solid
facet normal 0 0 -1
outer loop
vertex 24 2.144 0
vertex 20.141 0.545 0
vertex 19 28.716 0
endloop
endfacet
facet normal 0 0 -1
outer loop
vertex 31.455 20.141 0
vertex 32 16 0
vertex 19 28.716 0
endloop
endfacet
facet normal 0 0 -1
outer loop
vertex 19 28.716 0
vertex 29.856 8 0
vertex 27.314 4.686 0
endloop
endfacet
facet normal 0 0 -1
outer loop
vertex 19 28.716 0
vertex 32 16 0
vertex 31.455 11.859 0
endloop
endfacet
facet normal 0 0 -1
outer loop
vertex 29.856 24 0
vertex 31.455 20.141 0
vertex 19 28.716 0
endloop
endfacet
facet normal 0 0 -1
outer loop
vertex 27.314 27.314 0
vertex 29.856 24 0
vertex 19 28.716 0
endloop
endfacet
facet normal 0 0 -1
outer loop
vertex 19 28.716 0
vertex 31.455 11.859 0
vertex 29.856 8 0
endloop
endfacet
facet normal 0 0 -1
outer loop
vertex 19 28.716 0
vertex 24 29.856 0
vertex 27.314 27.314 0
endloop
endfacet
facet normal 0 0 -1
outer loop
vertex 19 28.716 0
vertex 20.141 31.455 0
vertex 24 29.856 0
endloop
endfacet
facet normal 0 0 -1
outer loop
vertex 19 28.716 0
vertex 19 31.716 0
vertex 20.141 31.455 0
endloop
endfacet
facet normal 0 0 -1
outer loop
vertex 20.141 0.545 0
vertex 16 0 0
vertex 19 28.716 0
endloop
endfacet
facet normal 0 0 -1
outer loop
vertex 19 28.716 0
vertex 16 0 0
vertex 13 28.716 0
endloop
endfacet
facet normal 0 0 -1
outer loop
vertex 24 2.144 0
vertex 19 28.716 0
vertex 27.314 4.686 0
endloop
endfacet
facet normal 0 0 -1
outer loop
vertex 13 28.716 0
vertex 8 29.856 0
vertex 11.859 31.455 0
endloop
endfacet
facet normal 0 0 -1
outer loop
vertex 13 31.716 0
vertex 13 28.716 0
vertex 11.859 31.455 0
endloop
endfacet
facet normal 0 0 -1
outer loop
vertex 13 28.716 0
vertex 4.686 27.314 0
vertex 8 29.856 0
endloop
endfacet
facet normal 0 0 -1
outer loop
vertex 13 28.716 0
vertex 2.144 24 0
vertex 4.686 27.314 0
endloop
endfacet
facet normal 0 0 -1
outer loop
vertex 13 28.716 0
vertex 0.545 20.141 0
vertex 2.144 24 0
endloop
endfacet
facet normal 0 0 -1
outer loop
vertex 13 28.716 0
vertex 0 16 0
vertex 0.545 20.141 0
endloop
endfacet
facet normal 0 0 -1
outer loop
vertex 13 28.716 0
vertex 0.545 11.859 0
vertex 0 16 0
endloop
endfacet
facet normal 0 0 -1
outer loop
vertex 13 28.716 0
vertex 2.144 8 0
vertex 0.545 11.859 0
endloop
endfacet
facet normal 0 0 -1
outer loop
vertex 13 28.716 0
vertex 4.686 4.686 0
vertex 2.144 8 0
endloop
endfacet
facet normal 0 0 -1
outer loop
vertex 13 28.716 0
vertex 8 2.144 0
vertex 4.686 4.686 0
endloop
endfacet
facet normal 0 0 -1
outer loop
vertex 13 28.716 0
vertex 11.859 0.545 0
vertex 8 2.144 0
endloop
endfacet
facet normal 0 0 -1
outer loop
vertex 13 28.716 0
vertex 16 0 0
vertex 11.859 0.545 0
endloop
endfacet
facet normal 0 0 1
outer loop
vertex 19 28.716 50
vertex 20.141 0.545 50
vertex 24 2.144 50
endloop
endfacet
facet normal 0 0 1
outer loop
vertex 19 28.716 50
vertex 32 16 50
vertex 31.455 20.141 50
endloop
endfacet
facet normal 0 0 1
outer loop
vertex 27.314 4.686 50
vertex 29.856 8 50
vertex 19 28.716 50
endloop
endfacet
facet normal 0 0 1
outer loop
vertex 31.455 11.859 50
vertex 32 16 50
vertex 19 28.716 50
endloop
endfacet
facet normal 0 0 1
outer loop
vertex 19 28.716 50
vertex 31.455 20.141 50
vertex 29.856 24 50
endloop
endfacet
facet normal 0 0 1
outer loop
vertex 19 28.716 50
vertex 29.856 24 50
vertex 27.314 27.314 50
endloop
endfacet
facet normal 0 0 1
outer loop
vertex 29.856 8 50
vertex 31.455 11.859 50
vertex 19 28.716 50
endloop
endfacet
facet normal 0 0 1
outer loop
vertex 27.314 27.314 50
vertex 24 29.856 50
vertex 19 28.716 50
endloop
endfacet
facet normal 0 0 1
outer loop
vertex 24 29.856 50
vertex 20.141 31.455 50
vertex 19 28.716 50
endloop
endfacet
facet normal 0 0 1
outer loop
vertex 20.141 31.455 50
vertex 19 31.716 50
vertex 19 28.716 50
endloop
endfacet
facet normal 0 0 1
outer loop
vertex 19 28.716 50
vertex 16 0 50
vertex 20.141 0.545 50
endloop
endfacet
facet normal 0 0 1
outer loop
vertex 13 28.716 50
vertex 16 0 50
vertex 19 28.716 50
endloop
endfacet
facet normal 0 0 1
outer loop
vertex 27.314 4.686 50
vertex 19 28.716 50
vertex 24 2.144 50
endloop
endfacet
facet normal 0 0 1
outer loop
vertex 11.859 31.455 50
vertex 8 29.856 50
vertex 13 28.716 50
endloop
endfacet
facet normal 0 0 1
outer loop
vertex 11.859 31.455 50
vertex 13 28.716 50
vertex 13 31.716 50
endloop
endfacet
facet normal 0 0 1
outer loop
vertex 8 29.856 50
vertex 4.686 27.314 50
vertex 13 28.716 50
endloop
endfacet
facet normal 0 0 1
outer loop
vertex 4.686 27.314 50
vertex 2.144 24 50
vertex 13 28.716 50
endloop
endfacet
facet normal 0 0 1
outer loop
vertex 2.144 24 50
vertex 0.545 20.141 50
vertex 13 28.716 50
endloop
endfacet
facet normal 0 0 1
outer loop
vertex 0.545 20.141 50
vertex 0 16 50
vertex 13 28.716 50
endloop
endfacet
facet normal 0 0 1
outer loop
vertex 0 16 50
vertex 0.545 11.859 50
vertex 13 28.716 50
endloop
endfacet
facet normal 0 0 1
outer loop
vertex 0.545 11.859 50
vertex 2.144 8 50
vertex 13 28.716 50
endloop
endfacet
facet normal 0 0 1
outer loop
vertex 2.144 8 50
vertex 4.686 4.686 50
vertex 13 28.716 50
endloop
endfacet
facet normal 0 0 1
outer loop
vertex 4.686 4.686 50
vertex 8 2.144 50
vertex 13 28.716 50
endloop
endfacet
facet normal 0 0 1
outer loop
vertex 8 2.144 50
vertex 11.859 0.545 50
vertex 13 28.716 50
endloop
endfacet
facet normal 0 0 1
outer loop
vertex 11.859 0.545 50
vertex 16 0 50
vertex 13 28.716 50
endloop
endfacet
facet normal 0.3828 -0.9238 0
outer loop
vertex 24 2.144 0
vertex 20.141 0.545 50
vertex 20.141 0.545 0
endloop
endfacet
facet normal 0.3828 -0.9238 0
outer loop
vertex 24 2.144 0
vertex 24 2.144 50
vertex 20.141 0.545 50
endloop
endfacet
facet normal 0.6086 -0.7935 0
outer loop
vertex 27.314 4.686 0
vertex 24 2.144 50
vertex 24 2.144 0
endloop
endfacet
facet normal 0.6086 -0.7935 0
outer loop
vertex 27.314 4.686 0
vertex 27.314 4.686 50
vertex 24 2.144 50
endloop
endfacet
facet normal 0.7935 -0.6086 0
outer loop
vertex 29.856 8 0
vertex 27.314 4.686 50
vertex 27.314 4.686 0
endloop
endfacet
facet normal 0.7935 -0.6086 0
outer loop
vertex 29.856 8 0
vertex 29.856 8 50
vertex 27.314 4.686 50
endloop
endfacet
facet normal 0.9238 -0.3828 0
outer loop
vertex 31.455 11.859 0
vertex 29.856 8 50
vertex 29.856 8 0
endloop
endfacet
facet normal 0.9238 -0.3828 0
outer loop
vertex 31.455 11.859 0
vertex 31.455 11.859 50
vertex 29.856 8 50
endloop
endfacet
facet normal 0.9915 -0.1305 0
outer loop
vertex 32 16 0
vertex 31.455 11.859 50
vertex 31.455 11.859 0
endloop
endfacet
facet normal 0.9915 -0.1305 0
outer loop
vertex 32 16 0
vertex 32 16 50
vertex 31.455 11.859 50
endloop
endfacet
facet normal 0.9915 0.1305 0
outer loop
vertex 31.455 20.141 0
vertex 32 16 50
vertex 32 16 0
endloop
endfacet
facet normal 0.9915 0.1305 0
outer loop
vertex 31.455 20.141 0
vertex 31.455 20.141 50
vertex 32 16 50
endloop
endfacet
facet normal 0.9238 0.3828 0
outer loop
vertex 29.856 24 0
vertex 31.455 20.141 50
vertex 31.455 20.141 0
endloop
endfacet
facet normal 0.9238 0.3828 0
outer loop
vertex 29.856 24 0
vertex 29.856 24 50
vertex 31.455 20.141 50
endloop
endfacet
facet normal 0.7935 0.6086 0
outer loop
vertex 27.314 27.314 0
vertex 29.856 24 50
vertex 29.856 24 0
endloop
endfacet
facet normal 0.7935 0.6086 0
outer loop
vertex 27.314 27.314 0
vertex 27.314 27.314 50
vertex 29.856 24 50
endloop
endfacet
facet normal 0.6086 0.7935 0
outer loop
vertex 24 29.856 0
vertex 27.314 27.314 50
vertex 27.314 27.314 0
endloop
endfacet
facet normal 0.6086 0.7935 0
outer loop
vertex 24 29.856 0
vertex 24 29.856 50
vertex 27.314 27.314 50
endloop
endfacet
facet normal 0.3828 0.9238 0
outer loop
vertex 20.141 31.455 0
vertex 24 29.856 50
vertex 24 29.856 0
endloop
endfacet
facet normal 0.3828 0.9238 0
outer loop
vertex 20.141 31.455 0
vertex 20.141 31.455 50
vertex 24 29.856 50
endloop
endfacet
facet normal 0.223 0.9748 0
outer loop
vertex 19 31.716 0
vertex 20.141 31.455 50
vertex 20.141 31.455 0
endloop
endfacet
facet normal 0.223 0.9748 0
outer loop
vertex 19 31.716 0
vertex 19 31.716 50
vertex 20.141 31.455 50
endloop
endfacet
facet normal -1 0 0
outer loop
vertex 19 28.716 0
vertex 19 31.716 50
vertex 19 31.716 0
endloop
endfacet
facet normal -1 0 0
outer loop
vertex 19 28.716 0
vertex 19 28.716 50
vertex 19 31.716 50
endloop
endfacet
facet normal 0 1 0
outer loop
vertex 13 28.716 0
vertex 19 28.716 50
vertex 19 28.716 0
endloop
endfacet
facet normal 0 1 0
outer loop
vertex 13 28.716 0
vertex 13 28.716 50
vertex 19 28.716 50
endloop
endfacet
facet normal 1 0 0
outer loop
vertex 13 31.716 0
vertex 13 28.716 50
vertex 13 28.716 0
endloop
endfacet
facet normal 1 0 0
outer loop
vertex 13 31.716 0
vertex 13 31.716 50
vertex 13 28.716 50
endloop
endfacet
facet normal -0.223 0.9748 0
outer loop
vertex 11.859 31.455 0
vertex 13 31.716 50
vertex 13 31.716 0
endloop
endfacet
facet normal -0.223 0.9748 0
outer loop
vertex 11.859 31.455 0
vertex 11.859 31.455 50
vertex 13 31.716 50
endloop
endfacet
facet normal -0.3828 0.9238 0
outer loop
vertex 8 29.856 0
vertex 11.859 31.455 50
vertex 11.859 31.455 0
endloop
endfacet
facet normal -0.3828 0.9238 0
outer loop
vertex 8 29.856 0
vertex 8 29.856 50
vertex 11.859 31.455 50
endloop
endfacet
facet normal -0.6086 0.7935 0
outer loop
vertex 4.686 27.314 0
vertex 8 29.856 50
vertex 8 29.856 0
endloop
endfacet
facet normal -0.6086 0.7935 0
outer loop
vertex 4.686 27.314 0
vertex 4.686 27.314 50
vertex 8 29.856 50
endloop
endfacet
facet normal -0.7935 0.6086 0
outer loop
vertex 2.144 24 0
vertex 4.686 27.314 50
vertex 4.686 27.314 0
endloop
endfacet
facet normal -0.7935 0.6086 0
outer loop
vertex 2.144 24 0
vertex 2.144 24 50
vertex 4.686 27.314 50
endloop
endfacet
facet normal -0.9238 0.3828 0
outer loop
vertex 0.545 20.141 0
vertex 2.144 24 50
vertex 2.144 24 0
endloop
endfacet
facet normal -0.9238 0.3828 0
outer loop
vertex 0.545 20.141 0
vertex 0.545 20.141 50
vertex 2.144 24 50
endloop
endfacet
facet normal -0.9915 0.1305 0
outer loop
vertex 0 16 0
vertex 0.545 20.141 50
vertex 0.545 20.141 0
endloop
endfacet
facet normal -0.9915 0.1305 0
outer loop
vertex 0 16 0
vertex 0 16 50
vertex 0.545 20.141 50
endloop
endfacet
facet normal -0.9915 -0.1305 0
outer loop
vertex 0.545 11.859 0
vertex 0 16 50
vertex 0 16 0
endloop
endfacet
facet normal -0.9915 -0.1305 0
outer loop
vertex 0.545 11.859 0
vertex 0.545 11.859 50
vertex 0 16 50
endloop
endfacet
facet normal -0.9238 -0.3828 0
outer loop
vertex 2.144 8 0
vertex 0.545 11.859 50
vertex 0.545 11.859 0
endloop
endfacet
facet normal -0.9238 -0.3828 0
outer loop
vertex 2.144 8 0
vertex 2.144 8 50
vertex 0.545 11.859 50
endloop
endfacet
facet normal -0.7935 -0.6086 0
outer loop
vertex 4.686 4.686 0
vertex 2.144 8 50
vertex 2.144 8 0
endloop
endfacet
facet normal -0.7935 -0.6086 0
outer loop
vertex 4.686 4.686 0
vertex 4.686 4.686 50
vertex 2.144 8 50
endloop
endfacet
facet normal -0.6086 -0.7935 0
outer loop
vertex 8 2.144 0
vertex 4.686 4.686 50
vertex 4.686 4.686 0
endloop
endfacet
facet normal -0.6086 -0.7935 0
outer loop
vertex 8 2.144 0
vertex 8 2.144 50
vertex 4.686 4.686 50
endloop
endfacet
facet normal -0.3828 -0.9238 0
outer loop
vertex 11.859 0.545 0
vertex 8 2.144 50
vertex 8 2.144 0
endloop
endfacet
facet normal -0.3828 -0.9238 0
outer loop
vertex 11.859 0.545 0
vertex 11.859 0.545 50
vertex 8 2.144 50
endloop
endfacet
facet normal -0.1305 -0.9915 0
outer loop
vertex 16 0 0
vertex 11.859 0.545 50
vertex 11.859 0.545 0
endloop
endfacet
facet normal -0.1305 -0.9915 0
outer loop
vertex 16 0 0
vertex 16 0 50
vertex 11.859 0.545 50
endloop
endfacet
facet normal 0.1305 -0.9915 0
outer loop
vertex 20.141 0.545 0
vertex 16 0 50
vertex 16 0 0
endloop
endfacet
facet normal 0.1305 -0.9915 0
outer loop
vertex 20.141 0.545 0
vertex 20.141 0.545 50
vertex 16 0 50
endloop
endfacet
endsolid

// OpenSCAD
$fn = 32;

// ----------------------------------------------------------------------
// Keyway shaft: d32 shaft, key 6 x 3 mm
// ----------------------------------------------------------------------

// --- parameters (mm) ---
shaft_r = 16;             // shaft radius
key_w = 6;                // keyway width
key_d = 3;                // keyway depth below the surface line
plate_t = 50;             // shaft length, Z (extrusion height)

shaft_d = 2 * shaft_r;  // shaft diameter
circle_step = 15;  // polygon sampling step, degrees

profile = [[11.859, 31.455], [8, 29.856], [4.686, 27.314], [2.144, 24], [0.545, 20.141], [0, 16], [0.545, 11.859], [2.144, 8], [4.686, 4.686], [8, 2.144], [11.859, 0.545], [16, 0], [20.141, 0.545], [24, 2.144], [27.314, 4.686], [29.856, 8], [31.455, 11.859], [32, 16], [31.455, 20.141], [29.856, 24], [27.314, 27.314], [24, 29.856], [20.141, 31.455], [19, 31.716], [19, 28.716], [13, 28.716], [13, 31.716]];  // primary outline, 27 points, counter clockwise

// --- the one profile operation ---
linear_extrude(height = plate_t) polygon(points = profile);
